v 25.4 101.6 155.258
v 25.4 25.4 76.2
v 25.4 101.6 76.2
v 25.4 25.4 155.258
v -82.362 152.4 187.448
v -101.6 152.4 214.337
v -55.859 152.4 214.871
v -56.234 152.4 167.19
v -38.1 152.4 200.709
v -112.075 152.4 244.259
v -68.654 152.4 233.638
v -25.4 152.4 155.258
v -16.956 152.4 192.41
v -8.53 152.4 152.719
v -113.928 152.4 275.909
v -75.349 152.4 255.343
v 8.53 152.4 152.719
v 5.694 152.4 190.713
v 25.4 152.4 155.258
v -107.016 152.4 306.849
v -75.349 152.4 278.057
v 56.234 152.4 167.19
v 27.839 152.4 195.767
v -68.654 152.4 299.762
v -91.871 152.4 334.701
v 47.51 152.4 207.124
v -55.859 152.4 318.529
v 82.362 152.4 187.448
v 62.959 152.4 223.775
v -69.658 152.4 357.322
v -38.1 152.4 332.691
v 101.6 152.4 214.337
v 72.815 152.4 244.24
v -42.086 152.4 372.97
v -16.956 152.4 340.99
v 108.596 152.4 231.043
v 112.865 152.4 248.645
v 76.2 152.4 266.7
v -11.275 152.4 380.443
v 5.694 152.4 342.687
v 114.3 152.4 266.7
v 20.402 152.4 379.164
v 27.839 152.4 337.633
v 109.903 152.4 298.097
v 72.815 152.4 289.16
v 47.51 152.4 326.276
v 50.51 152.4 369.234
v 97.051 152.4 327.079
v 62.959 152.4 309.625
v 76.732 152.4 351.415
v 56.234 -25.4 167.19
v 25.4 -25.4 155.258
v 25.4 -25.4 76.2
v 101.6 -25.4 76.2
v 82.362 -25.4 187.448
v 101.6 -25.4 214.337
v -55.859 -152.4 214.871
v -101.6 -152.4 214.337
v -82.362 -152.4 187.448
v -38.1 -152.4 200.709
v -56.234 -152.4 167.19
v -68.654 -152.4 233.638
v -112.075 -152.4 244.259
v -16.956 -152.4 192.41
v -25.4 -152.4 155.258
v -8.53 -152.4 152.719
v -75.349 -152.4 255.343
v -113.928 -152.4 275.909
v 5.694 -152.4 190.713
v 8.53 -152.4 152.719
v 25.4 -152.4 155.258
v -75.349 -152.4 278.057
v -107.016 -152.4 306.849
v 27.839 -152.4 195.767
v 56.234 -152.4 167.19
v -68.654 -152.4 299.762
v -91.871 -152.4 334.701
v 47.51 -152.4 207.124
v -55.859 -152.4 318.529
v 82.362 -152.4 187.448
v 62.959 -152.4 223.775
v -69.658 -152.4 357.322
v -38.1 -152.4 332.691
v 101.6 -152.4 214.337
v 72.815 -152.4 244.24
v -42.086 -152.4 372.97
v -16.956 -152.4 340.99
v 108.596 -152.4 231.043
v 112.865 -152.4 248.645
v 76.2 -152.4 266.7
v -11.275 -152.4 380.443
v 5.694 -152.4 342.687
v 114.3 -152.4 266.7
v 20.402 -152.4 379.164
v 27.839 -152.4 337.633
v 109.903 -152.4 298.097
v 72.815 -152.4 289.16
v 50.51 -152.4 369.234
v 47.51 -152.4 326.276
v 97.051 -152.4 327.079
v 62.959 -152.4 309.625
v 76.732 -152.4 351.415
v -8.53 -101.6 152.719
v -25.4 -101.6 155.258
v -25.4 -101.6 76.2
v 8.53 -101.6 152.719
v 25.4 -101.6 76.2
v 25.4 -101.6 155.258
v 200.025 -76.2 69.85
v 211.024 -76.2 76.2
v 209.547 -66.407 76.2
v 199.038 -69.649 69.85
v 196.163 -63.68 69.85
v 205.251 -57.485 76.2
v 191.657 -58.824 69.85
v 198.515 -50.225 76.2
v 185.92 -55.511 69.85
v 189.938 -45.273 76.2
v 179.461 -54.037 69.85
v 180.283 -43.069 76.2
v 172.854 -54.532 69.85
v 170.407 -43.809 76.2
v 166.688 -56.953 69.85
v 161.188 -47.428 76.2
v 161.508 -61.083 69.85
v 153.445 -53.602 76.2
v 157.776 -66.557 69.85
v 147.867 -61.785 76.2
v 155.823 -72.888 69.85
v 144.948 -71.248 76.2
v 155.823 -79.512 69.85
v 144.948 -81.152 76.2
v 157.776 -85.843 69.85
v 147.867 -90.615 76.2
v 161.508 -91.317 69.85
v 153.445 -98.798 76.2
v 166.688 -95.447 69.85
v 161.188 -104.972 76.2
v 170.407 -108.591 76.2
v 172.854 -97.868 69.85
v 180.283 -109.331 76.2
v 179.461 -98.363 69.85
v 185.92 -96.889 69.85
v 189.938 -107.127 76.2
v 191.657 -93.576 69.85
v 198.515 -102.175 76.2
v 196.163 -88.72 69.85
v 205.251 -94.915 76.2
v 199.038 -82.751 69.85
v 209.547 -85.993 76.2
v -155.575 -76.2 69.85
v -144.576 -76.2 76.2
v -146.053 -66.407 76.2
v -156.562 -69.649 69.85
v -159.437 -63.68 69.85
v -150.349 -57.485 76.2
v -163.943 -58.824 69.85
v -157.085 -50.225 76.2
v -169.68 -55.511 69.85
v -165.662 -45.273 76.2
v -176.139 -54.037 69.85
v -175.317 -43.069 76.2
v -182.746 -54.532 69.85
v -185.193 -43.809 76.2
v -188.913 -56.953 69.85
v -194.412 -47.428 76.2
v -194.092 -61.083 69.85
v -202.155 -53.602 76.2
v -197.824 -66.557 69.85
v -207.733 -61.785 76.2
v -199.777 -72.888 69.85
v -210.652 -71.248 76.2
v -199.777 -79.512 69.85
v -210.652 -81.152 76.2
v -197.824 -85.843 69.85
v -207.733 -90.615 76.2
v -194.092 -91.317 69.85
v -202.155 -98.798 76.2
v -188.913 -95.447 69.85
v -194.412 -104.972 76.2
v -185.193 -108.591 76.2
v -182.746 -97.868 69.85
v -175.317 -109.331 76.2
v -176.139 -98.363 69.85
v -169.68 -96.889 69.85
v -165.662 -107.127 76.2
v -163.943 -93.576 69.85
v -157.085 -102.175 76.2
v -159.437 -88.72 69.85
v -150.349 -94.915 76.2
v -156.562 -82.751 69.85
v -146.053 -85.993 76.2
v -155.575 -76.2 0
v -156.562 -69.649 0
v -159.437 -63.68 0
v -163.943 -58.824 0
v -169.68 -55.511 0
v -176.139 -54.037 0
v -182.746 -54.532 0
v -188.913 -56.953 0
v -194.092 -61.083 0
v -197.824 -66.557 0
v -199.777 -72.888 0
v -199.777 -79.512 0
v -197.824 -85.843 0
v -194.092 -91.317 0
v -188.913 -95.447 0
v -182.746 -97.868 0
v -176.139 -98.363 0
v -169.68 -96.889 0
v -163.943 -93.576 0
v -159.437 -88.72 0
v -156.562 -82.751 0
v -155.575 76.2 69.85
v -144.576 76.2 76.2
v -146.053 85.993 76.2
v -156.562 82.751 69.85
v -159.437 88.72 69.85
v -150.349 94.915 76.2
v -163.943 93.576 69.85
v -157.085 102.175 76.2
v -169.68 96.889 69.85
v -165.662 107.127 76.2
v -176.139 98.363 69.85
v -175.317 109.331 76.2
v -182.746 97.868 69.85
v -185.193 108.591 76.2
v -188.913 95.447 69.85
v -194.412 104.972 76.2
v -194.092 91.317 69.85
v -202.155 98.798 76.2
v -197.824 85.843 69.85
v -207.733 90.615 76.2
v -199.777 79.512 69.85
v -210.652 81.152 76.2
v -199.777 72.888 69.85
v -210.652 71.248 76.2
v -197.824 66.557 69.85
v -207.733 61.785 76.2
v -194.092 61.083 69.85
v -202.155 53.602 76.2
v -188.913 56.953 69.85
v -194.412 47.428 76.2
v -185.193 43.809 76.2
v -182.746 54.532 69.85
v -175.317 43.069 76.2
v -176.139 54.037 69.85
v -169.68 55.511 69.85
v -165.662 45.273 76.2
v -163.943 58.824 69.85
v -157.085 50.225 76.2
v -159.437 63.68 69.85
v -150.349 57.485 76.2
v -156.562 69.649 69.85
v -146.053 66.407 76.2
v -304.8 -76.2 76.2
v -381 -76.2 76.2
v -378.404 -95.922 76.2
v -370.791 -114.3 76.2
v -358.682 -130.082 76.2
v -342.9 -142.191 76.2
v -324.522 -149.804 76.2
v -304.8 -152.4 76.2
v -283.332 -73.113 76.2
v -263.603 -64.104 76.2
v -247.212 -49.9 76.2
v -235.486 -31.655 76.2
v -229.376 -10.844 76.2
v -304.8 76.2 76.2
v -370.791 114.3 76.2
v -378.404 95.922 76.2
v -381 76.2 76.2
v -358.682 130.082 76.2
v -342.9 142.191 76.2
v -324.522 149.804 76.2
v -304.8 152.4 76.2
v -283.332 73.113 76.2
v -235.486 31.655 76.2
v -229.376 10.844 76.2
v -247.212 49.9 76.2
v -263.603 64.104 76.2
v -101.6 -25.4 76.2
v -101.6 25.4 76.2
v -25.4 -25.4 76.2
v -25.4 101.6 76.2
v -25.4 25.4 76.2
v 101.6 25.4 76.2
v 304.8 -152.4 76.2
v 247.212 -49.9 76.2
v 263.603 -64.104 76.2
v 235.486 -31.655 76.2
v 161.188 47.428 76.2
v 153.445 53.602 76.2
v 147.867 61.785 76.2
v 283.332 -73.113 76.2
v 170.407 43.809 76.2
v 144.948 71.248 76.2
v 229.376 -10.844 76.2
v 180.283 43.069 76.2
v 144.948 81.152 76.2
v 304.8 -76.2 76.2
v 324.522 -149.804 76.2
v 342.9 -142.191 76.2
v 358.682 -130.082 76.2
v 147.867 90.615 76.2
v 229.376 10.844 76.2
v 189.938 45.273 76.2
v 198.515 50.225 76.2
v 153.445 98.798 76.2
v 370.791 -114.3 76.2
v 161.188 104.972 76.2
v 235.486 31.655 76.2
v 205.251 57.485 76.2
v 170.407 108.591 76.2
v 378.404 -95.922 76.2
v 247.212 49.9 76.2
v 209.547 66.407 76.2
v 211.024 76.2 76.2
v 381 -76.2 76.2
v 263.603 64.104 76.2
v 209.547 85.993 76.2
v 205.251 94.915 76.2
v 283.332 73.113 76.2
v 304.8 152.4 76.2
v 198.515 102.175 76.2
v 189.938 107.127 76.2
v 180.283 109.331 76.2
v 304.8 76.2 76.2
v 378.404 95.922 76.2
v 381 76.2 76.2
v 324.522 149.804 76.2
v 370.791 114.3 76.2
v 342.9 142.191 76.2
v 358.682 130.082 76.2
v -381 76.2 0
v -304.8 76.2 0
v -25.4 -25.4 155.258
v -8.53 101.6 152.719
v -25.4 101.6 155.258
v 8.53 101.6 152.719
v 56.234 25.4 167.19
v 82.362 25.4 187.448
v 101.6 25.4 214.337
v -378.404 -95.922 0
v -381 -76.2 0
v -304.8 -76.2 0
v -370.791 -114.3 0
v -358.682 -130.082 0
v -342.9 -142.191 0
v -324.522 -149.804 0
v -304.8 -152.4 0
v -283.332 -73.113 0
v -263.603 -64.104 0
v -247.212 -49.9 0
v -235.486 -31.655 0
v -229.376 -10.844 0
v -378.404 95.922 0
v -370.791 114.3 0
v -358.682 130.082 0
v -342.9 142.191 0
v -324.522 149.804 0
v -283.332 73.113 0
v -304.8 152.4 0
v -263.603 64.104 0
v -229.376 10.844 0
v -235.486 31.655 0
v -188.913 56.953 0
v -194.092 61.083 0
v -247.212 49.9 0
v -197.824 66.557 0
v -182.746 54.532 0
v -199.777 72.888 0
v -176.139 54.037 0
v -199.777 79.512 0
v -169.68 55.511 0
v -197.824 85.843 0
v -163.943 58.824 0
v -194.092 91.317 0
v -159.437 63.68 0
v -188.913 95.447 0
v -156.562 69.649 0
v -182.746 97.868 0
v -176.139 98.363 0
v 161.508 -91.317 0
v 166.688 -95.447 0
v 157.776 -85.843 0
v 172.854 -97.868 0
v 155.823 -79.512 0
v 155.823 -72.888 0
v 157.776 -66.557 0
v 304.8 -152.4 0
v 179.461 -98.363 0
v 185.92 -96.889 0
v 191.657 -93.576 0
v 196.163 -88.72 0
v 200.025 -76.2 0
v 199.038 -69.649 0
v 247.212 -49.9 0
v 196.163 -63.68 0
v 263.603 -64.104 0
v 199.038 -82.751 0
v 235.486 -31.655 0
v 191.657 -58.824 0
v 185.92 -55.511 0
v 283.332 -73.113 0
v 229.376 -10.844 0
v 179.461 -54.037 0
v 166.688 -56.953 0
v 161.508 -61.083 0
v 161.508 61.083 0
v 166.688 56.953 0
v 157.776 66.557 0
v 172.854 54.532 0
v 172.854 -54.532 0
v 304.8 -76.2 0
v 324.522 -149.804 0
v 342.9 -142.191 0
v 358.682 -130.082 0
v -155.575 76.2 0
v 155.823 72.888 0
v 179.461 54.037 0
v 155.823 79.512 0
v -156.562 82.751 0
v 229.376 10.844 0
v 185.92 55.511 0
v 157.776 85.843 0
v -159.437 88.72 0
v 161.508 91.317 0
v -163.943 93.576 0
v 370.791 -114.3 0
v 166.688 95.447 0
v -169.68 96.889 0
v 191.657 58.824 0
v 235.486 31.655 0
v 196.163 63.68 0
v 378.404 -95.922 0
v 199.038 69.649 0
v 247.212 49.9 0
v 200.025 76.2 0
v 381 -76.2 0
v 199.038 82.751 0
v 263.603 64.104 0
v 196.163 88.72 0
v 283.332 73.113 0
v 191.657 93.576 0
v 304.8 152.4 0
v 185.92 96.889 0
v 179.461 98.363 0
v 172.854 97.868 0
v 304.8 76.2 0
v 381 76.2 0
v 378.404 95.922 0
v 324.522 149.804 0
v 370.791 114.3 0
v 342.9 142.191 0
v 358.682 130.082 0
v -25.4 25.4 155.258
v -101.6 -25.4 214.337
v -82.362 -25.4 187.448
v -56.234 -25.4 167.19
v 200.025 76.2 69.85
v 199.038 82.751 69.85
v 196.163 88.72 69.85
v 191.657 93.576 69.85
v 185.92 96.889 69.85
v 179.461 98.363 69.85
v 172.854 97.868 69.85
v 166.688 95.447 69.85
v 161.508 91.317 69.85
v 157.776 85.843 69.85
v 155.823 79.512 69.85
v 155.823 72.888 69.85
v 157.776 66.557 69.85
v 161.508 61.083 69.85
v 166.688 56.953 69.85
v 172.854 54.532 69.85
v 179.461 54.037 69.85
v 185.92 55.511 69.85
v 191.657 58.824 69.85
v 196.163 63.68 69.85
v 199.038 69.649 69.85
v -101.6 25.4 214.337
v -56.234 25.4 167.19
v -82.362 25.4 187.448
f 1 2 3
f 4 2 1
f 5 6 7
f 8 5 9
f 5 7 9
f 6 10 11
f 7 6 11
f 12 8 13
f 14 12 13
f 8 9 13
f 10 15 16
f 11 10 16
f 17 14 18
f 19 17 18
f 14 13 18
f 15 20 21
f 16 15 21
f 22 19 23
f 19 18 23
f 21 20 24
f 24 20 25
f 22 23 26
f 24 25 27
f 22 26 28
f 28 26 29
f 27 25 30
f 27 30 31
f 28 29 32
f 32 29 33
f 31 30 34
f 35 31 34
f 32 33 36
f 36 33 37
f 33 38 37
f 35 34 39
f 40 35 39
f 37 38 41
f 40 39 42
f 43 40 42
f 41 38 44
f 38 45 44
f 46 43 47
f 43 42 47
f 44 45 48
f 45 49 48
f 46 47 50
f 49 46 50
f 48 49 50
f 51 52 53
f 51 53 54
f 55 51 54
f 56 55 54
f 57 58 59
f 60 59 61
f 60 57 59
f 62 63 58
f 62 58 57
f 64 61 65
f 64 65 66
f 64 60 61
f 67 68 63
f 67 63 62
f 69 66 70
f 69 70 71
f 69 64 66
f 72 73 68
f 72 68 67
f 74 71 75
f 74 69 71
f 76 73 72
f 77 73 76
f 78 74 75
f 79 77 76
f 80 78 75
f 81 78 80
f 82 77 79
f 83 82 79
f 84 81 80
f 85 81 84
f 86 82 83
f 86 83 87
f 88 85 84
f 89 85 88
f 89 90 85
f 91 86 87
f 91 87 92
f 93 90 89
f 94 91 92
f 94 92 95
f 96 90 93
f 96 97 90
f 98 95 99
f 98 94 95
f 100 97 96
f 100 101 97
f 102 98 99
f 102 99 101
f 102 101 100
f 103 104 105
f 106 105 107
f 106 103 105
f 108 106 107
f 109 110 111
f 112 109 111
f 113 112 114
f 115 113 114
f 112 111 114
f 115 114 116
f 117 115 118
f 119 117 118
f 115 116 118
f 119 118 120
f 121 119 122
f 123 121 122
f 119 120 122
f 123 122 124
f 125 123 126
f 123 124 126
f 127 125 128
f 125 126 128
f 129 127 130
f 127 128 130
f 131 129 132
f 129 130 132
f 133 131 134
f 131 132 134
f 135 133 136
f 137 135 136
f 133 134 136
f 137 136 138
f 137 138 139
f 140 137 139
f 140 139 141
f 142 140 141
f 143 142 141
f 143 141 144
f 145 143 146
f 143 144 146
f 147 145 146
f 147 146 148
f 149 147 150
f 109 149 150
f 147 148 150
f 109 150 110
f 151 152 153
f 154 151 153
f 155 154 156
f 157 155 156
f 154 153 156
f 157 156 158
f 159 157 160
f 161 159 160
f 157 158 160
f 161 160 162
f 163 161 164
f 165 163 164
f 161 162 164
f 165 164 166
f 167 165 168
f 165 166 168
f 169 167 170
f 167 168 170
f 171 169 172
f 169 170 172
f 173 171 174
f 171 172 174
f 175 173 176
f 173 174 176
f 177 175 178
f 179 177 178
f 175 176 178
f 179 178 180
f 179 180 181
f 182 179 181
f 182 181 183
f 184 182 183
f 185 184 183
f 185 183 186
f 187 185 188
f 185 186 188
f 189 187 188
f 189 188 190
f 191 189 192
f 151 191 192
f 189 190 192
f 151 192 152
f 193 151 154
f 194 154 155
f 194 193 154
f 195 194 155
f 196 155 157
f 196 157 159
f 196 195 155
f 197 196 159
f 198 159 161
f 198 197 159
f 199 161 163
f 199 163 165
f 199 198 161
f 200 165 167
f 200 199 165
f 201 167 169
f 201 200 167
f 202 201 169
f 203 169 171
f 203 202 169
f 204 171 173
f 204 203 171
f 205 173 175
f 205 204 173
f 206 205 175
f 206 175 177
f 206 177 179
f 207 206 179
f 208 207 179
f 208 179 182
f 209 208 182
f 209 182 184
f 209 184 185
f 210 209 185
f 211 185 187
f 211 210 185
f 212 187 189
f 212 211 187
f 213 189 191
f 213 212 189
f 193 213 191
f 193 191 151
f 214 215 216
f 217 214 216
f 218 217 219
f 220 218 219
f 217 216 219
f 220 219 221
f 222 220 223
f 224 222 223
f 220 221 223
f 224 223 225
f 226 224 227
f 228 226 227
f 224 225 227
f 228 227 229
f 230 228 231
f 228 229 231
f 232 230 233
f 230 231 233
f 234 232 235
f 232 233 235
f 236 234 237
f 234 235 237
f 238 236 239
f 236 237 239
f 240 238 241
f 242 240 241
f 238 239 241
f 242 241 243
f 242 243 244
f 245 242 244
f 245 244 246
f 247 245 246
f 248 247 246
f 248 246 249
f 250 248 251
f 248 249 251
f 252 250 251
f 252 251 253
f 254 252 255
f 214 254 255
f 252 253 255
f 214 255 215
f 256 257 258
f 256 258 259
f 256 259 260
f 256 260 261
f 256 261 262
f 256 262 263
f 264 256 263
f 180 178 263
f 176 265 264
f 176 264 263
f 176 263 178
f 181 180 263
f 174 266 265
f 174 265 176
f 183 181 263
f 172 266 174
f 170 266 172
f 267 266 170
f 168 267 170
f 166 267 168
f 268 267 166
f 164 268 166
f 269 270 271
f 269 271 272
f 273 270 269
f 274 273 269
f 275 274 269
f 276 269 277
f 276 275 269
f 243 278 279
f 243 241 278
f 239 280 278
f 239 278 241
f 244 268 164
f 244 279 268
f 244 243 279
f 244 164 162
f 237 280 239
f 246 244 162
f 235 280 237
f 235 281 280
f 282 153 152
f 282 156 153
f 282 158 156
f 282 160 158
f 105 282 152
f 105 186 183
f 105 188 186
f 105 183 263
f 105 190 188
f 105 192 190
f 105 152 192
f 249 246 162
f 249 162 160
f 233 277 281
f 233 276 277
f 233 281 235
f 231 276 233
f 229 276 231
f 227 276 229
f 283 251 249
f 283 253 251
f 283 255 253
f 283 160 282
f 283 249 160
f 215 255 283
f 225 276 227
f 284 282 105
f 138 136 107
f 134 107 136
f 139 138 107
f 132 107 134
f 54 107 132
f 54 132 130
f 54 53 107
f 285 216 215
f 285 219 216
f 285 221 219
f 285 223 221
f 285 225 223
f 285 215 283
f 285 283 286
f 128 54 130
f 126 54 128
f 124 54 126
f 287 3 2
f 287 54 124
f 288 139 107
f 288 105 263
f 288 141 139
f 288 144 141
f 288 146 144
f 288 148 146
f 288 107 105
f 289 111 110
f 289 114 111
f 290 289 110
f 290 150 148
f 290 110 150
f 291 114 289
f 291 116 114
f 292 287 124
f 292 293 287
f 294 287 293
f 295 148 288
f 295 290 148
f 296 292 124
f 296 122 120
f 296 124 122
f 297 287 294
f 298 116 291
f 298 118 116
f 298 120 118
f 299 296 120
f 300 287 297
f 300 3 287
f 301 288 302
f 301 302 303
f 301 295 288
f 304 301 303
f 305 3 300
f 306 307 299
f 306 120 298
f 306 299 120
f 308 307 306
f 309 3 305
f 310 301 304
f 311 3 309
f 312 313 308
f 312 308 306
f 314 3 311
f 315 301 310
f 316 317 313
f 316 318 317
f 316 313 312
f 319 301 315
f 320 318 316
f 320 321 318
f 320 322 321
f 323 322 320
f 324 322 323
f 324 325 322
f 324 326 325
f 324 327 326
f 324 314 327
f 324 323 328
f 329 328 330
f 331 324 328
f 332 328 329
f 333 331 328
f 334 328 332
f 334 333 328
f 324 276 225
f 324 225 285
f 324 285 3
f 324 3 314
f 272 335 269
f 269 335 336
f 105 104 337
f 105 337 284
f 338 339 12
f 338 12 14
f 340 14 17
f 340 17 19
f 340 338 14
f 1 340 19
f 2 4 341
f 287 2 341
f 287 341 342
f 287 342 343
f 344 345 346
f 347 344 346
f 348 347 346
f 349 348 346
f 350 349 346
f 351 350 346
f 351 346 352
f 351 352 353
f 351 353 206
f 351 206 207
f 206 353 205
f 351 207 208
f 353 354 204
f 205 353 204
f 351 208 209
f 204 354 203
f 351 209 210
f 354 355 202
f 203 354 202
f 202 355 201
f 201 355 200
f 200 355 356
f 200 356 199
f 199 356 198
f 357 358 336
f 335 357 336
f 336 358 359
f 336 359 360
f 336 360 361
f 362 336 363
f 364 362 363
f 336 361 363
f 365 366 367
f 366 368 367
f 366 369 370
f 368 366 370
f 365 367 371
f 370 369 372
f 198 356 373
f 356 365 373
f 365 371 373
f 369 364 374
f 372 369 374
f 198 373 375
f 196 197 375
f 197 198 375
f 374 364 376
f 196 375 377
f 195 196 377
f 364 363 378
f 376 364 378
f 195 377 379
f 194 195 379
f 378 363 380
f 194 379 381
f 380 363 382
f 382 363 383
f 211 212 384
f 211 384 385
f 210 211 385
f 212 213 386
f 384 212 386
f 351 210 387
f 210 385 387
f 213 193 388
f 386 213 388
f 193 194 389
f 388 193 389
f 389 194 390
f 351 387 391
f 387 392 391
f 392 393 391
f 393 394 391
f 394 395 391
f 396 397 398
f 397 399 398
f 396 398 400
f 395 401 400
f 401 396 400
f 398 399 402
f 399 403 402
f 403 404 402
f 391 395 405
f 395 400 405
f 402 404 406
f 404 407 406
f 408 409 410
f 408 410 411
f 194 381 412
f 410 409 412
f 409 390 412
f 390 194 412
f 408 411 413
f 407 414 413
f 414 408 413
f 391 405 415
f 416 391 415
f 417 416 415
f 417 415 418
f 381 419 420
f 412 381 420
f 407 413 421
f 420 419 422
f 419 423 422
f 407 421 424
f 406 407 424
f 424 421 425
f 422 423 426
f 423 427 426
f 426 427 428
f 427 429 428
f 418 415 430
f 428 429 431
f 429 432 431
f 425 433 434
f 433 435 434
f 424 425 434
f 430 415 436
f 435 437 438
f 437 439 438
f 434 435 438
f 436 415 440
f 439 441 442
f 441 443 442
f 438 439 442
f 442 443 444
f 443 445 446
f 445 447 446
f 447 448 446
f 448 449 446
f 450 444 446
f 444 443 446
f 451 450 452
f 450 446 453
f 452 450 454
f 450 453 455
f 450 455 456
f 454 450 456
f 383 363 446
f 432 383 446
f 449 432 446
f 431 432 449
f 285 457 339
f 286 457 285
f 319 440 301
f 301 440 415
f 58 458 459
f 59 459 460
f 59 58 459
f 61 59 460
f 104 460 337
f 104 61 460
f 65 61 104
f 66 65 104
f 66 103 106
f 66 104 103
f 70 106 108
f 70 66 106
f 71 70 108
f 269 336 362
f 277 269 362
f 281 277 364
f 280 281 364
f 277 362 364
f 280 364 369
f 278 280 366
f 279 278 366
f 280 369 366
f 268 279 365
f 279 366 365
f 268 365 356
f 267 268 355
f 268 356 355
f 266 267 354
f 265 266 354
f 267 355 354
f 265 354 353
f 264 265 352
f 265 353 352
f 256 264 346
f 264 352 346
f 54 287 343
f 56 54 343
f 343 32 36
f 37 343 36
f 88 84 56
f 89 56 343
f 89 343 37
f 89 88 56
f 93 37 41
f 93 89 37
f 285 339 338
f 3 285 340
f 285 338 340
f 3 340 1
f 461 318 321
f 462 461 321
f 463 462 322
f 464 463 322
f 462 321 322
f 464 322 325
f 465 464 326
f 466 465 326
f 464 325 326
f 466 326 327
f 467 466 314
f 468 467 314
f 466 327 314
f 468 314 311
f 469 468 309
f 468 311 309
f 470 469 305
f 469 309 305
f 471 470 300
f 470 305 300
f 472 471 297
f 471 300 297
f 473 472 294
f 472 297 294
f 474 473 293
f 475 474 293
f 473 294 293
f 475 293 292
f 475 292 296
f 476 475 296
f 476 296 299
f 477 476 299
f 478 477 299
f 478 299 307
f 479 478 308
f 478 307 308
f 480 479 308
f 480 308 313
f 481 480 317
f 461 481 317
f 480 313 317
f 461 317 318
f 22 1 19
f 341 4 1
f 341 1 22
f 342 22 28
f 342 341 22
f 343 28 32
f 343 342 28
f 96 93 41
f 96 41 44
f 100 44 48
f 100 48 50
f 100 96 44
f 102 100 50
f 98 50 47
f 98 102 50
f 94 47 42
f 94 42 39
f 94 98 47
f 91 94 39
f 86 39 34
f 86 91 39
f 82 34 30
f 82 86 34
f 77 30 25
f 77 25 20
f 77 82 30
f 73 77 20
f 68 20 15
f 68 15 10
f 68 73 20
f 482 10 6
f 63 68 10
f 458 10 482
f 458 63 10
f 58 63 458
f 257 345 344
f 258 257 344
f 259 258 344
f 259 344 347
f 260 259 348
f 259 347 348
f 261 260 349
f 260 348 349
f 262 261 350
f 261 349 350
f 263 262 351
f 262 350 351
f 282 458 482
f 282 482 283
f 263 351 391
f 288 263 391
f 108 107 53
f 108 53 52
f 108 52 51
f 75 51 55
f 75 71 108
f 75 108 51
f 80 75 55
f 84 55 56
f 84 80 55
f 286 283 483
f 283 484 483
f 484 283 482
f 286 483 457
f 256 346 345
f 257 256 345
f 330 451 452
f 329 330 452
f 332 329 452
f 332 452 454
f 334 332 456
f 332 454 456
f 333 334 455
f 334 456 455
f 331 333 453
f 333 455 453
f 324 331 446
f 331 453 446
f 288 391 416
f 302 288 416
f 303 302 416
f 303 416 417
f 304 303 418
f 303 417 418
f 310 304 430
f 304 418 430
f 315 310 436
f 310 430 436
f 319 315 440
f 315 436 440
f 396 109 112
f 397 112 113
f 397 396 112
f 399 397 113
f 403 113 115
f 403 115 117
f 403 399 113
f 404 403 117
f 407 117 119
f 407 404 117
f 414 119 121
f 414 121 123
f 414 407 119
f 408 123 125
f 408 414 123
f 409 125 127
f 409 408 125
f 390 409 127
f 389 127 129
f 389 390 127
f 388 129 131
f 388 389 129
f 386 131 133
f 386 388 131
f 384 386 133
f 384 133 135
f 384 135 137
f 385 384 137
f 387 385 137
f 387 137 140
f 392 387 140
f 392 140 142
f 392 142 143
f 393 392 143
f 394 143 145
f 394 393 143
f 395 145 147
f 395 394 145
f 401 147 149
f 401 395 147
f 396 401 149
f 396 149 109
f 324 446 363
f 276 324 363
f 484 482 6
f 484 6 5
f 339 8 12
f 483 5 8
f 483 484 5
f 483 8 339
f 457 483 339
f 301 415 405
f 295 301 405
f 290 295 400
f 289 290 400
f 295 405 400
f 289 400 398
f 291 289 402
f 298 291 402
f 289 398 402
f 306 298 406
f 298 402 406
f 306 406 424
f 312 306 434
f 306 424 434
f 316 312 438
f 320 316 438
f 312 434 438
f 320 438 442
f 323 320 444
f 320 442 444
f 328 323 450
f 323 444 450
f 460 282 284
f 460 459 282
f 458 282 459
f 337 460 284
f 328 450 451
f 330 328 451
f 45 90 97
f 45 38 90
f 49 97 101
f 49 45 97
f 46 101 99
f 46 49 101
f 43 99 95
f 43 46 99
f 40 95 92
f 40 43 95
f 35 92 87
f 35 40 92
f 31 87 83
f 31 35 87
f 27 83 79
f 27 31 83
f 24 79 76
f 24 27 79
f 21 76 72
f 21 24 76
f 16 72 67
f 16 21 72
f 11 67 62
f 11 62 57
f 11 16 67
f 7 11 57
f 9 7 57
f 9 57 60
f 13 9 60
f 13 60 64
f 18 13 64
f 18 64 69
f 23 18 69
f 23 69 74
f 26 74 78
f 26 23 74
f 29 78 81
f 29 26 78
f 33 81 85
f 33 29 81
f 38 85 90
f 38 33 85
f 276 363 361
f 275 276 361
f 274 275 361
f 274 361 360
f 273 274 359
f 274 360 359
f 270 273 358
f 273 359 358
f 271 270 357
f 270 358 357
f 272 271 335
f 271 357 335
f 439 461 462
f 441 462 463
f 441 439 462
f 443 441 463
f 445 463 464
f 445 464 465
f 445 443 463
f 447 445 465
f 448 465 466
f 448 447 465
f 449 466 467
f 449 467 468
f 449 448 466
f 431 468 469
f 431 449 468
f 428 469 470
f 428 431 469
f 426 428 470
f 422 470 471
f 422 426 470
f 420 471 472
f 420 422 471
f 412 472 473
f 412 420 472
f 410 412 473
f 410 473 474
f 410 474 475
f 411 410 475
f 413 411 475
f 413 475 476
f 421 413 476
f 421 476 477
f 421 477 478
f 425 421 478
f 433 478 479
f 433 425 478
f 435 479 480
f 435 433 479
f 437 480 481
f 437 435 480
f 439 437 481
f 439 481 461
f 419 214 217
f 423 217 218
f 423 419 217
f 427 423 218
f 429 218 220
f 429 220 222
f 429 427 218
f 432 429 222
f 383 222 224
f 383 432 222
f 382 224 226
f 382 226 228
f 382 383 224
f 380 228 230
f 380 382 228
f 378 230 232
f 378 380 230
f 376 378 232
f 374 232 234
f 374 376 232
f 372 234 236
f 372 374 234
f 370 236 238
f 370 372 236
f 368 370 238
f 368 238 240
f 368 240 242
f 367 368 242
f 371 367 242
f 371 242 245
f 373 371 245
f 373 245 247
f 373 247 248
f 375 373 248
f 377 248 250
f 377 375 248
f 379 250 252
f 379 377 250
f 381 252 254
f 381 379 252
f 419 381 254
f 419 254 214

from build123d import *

# Parameters (mm, degrees)
F0_R     = 38.1
F0_W     = 228.6
F0_H     = 304.8
F0_R_2   = 22.225
F1_DEPTH = 76.2
F2_SIZE2 = 10.998523
F2_SIZE  = 6.35
F4_DEPTH = 101.6
F5_DEPTH = 25.4
F3_R     = 76.2
F6_DEPTH = 152.4


with BuildPart() as f1:
    # F0 (on Top) → F1 (new body)
    with BuildSketch(Plane.XY):
        with BuildLine():
            Line((-114.3, 152.4), (-304.8, 152.4))
            ThreePointArc((-304.8, 152.4), (-358.681537, 130.081537), (-381, 76.2))
            Line((-381, 76.2), (-304.8, 76.2))
            ThreePointArc((-304.8, 76.2), (-228.6, 0), (-304.8, -76.2))
            Line((-304.8, -76.2), (-381, -76.2))
            ThreePointArc((-381, -76.2), (-358.681537, -130.081537), (-304.8, -152.4))
            Line((-304.8, -152.4), (-114.3, -152.4))
            Line((-114.3, -152.4), (-114.3, 152.4))
        make_face()
        with Locations((-177.8, -76.2)):
            Circle(F0_R, mode=Mode.SUBTRACT)
        with Locations((-177.8, 76.2)):
            Circle(F0_R, mode=Mode.SUBTRACT)
        Rectangle(F0_W, F0_H)
        with BuildLine():
            Line((304.8, 152.4), (114.3, 152.4))
            Line((114.3, 152.4), (114.3, -152.4))
            Line((114.3, -152.4), (304.8, -152.4))
            ThreePointArc((304.8, -152.4), (358.681537, -130.081537), (381, -76.2))
            Line((381, -76.2), (304.8, -76.2))
            ThreePointArc((304.8, -76.2), (228.6, 0), (304.8, 76.2))
            Line((304.8, 76.2), (381, 76.2))
            ThreePointArc((381, 76.2), (358.681537, 130.081537), (304.8, 152.4))
        make_face()
        with Locations((177.8, -76.2)):
            Circle(F0_R, mode=Mode.SUBTRACT)
        with Locations((177.8, 76.2)):
            Circle(F0_R, mode=Mode.SUBTRACT)
        with Locations((177.8, 76.2)):
            Circle(F0_R)
        with Locations((177.8, 76.2)):
            Circle(F0_R_2, mode=Mode.SUBTRACT)
        with Locations((177.8, -76.2)):
            Circle(F0_R)
        with Locations((177.8, -76.2)):
            Circle(F0_R_2, mode=Mode.SUBTRACT)
        with Locations((-177.8, -76.2)):
            Circle(F0_R)
        with Locations((-177.8, -76.2)):
            Circle(F0_R_2, mode=Mode.SUBTRACT)
        with Locations((-177.8, 76.2)):
            Circle(F0_R)
        with Locations((-177.8, 76.2)):
            Circle(F0_R_2, mode=Mode.SUBTRACT)
    extrude(amount=F1_DEPTH)

    # F2
    f2_edges = [f1.edges().sort_by_distance(p)[0] for p in [
        (-200.025, 76.2, 76.2),
        (-200.025, -76.2, 76.2),
        (155.575, -76.2, 76.2),
        (155.575, 76.2, 76.2),
    ]]
    chamfer(f2_edges, length=F2_SIZE, length2=F2_SIZE2)

    # F3 (on Front) → F4 (join, symmetric)
    with BuildSketch(Plane.XZ):
        with BuildLine():
            ThreePointArc((25.4, 155.257952), (0, 152.4), (-25.4, 155.257952))
            Line((-25.4, 155.257952), (-25.4, 76.2))
            Line((-25.4, 76.2), (25.4, 76.2))
            Line((25.4, 76.2), (25.4, 155.257952))
        make_face()
    extrude(amount=F4_DEPTH, both=True)

    # F3 (on Front) → F5 (join, symmetric)
    with BuildSketch(Plane.XZ):
        with BuildLine():
            Line((101.6, 76.2), (101.6, 214.336559))
            ThreePointArc((101.6, 214.336559), (70.034423, 176.369111), (25.4, 155.257952))
            Line((25.4, 155.257952), (25.4, 76.2))
            Line((25.4, 76.2), (101.6, 76.2))
        make_face()
        with BuildLine():
            ThreePointArc((-25.4, 155.257952), (-70.034423, 176.369111), (-101.6, 214.336559))
            Line((-101.6, 214.336559), (-101.6, 76.2))
            Line((-101.6, 76.2), (-25.4, 76.2))
            Line((-25.4, 76.2), (-25.4, 155.257952))
        make_face()
    extrude(amount=F5_DEPTH, both=True)

    # F3 (on Front) → F6 (join, symmetric)
    with BuildSketch(Plane.XZ):
        with BuildLine():
            ThreePointArc((101.6, 214.336559), (111.079634, 239.759232), (114.3, 266.7))
            ThreePointArc((114.3, 266.7), (-26.940768, 377.779634), (-101.6, 214.336559))
            ThreePointArc((-101.6, 214.336559), (-70.034423, 176.369111), (-25.4, 155.257952))
            ThreePointArc((-25.4, 155.257952), (0, 152.4), (25.4, 155.257952))
            ThreePointArc((25.4, 155.257952), (70.034423, 176.369111), (101.6, 214.336559))
        make_face()
        with Locations((0, 266.7)):
            Circle(F3_R, mode=Mode.SUBTRACT)
    extrude(amount=F6_DEPTH, both=True)


solid = f1.part
